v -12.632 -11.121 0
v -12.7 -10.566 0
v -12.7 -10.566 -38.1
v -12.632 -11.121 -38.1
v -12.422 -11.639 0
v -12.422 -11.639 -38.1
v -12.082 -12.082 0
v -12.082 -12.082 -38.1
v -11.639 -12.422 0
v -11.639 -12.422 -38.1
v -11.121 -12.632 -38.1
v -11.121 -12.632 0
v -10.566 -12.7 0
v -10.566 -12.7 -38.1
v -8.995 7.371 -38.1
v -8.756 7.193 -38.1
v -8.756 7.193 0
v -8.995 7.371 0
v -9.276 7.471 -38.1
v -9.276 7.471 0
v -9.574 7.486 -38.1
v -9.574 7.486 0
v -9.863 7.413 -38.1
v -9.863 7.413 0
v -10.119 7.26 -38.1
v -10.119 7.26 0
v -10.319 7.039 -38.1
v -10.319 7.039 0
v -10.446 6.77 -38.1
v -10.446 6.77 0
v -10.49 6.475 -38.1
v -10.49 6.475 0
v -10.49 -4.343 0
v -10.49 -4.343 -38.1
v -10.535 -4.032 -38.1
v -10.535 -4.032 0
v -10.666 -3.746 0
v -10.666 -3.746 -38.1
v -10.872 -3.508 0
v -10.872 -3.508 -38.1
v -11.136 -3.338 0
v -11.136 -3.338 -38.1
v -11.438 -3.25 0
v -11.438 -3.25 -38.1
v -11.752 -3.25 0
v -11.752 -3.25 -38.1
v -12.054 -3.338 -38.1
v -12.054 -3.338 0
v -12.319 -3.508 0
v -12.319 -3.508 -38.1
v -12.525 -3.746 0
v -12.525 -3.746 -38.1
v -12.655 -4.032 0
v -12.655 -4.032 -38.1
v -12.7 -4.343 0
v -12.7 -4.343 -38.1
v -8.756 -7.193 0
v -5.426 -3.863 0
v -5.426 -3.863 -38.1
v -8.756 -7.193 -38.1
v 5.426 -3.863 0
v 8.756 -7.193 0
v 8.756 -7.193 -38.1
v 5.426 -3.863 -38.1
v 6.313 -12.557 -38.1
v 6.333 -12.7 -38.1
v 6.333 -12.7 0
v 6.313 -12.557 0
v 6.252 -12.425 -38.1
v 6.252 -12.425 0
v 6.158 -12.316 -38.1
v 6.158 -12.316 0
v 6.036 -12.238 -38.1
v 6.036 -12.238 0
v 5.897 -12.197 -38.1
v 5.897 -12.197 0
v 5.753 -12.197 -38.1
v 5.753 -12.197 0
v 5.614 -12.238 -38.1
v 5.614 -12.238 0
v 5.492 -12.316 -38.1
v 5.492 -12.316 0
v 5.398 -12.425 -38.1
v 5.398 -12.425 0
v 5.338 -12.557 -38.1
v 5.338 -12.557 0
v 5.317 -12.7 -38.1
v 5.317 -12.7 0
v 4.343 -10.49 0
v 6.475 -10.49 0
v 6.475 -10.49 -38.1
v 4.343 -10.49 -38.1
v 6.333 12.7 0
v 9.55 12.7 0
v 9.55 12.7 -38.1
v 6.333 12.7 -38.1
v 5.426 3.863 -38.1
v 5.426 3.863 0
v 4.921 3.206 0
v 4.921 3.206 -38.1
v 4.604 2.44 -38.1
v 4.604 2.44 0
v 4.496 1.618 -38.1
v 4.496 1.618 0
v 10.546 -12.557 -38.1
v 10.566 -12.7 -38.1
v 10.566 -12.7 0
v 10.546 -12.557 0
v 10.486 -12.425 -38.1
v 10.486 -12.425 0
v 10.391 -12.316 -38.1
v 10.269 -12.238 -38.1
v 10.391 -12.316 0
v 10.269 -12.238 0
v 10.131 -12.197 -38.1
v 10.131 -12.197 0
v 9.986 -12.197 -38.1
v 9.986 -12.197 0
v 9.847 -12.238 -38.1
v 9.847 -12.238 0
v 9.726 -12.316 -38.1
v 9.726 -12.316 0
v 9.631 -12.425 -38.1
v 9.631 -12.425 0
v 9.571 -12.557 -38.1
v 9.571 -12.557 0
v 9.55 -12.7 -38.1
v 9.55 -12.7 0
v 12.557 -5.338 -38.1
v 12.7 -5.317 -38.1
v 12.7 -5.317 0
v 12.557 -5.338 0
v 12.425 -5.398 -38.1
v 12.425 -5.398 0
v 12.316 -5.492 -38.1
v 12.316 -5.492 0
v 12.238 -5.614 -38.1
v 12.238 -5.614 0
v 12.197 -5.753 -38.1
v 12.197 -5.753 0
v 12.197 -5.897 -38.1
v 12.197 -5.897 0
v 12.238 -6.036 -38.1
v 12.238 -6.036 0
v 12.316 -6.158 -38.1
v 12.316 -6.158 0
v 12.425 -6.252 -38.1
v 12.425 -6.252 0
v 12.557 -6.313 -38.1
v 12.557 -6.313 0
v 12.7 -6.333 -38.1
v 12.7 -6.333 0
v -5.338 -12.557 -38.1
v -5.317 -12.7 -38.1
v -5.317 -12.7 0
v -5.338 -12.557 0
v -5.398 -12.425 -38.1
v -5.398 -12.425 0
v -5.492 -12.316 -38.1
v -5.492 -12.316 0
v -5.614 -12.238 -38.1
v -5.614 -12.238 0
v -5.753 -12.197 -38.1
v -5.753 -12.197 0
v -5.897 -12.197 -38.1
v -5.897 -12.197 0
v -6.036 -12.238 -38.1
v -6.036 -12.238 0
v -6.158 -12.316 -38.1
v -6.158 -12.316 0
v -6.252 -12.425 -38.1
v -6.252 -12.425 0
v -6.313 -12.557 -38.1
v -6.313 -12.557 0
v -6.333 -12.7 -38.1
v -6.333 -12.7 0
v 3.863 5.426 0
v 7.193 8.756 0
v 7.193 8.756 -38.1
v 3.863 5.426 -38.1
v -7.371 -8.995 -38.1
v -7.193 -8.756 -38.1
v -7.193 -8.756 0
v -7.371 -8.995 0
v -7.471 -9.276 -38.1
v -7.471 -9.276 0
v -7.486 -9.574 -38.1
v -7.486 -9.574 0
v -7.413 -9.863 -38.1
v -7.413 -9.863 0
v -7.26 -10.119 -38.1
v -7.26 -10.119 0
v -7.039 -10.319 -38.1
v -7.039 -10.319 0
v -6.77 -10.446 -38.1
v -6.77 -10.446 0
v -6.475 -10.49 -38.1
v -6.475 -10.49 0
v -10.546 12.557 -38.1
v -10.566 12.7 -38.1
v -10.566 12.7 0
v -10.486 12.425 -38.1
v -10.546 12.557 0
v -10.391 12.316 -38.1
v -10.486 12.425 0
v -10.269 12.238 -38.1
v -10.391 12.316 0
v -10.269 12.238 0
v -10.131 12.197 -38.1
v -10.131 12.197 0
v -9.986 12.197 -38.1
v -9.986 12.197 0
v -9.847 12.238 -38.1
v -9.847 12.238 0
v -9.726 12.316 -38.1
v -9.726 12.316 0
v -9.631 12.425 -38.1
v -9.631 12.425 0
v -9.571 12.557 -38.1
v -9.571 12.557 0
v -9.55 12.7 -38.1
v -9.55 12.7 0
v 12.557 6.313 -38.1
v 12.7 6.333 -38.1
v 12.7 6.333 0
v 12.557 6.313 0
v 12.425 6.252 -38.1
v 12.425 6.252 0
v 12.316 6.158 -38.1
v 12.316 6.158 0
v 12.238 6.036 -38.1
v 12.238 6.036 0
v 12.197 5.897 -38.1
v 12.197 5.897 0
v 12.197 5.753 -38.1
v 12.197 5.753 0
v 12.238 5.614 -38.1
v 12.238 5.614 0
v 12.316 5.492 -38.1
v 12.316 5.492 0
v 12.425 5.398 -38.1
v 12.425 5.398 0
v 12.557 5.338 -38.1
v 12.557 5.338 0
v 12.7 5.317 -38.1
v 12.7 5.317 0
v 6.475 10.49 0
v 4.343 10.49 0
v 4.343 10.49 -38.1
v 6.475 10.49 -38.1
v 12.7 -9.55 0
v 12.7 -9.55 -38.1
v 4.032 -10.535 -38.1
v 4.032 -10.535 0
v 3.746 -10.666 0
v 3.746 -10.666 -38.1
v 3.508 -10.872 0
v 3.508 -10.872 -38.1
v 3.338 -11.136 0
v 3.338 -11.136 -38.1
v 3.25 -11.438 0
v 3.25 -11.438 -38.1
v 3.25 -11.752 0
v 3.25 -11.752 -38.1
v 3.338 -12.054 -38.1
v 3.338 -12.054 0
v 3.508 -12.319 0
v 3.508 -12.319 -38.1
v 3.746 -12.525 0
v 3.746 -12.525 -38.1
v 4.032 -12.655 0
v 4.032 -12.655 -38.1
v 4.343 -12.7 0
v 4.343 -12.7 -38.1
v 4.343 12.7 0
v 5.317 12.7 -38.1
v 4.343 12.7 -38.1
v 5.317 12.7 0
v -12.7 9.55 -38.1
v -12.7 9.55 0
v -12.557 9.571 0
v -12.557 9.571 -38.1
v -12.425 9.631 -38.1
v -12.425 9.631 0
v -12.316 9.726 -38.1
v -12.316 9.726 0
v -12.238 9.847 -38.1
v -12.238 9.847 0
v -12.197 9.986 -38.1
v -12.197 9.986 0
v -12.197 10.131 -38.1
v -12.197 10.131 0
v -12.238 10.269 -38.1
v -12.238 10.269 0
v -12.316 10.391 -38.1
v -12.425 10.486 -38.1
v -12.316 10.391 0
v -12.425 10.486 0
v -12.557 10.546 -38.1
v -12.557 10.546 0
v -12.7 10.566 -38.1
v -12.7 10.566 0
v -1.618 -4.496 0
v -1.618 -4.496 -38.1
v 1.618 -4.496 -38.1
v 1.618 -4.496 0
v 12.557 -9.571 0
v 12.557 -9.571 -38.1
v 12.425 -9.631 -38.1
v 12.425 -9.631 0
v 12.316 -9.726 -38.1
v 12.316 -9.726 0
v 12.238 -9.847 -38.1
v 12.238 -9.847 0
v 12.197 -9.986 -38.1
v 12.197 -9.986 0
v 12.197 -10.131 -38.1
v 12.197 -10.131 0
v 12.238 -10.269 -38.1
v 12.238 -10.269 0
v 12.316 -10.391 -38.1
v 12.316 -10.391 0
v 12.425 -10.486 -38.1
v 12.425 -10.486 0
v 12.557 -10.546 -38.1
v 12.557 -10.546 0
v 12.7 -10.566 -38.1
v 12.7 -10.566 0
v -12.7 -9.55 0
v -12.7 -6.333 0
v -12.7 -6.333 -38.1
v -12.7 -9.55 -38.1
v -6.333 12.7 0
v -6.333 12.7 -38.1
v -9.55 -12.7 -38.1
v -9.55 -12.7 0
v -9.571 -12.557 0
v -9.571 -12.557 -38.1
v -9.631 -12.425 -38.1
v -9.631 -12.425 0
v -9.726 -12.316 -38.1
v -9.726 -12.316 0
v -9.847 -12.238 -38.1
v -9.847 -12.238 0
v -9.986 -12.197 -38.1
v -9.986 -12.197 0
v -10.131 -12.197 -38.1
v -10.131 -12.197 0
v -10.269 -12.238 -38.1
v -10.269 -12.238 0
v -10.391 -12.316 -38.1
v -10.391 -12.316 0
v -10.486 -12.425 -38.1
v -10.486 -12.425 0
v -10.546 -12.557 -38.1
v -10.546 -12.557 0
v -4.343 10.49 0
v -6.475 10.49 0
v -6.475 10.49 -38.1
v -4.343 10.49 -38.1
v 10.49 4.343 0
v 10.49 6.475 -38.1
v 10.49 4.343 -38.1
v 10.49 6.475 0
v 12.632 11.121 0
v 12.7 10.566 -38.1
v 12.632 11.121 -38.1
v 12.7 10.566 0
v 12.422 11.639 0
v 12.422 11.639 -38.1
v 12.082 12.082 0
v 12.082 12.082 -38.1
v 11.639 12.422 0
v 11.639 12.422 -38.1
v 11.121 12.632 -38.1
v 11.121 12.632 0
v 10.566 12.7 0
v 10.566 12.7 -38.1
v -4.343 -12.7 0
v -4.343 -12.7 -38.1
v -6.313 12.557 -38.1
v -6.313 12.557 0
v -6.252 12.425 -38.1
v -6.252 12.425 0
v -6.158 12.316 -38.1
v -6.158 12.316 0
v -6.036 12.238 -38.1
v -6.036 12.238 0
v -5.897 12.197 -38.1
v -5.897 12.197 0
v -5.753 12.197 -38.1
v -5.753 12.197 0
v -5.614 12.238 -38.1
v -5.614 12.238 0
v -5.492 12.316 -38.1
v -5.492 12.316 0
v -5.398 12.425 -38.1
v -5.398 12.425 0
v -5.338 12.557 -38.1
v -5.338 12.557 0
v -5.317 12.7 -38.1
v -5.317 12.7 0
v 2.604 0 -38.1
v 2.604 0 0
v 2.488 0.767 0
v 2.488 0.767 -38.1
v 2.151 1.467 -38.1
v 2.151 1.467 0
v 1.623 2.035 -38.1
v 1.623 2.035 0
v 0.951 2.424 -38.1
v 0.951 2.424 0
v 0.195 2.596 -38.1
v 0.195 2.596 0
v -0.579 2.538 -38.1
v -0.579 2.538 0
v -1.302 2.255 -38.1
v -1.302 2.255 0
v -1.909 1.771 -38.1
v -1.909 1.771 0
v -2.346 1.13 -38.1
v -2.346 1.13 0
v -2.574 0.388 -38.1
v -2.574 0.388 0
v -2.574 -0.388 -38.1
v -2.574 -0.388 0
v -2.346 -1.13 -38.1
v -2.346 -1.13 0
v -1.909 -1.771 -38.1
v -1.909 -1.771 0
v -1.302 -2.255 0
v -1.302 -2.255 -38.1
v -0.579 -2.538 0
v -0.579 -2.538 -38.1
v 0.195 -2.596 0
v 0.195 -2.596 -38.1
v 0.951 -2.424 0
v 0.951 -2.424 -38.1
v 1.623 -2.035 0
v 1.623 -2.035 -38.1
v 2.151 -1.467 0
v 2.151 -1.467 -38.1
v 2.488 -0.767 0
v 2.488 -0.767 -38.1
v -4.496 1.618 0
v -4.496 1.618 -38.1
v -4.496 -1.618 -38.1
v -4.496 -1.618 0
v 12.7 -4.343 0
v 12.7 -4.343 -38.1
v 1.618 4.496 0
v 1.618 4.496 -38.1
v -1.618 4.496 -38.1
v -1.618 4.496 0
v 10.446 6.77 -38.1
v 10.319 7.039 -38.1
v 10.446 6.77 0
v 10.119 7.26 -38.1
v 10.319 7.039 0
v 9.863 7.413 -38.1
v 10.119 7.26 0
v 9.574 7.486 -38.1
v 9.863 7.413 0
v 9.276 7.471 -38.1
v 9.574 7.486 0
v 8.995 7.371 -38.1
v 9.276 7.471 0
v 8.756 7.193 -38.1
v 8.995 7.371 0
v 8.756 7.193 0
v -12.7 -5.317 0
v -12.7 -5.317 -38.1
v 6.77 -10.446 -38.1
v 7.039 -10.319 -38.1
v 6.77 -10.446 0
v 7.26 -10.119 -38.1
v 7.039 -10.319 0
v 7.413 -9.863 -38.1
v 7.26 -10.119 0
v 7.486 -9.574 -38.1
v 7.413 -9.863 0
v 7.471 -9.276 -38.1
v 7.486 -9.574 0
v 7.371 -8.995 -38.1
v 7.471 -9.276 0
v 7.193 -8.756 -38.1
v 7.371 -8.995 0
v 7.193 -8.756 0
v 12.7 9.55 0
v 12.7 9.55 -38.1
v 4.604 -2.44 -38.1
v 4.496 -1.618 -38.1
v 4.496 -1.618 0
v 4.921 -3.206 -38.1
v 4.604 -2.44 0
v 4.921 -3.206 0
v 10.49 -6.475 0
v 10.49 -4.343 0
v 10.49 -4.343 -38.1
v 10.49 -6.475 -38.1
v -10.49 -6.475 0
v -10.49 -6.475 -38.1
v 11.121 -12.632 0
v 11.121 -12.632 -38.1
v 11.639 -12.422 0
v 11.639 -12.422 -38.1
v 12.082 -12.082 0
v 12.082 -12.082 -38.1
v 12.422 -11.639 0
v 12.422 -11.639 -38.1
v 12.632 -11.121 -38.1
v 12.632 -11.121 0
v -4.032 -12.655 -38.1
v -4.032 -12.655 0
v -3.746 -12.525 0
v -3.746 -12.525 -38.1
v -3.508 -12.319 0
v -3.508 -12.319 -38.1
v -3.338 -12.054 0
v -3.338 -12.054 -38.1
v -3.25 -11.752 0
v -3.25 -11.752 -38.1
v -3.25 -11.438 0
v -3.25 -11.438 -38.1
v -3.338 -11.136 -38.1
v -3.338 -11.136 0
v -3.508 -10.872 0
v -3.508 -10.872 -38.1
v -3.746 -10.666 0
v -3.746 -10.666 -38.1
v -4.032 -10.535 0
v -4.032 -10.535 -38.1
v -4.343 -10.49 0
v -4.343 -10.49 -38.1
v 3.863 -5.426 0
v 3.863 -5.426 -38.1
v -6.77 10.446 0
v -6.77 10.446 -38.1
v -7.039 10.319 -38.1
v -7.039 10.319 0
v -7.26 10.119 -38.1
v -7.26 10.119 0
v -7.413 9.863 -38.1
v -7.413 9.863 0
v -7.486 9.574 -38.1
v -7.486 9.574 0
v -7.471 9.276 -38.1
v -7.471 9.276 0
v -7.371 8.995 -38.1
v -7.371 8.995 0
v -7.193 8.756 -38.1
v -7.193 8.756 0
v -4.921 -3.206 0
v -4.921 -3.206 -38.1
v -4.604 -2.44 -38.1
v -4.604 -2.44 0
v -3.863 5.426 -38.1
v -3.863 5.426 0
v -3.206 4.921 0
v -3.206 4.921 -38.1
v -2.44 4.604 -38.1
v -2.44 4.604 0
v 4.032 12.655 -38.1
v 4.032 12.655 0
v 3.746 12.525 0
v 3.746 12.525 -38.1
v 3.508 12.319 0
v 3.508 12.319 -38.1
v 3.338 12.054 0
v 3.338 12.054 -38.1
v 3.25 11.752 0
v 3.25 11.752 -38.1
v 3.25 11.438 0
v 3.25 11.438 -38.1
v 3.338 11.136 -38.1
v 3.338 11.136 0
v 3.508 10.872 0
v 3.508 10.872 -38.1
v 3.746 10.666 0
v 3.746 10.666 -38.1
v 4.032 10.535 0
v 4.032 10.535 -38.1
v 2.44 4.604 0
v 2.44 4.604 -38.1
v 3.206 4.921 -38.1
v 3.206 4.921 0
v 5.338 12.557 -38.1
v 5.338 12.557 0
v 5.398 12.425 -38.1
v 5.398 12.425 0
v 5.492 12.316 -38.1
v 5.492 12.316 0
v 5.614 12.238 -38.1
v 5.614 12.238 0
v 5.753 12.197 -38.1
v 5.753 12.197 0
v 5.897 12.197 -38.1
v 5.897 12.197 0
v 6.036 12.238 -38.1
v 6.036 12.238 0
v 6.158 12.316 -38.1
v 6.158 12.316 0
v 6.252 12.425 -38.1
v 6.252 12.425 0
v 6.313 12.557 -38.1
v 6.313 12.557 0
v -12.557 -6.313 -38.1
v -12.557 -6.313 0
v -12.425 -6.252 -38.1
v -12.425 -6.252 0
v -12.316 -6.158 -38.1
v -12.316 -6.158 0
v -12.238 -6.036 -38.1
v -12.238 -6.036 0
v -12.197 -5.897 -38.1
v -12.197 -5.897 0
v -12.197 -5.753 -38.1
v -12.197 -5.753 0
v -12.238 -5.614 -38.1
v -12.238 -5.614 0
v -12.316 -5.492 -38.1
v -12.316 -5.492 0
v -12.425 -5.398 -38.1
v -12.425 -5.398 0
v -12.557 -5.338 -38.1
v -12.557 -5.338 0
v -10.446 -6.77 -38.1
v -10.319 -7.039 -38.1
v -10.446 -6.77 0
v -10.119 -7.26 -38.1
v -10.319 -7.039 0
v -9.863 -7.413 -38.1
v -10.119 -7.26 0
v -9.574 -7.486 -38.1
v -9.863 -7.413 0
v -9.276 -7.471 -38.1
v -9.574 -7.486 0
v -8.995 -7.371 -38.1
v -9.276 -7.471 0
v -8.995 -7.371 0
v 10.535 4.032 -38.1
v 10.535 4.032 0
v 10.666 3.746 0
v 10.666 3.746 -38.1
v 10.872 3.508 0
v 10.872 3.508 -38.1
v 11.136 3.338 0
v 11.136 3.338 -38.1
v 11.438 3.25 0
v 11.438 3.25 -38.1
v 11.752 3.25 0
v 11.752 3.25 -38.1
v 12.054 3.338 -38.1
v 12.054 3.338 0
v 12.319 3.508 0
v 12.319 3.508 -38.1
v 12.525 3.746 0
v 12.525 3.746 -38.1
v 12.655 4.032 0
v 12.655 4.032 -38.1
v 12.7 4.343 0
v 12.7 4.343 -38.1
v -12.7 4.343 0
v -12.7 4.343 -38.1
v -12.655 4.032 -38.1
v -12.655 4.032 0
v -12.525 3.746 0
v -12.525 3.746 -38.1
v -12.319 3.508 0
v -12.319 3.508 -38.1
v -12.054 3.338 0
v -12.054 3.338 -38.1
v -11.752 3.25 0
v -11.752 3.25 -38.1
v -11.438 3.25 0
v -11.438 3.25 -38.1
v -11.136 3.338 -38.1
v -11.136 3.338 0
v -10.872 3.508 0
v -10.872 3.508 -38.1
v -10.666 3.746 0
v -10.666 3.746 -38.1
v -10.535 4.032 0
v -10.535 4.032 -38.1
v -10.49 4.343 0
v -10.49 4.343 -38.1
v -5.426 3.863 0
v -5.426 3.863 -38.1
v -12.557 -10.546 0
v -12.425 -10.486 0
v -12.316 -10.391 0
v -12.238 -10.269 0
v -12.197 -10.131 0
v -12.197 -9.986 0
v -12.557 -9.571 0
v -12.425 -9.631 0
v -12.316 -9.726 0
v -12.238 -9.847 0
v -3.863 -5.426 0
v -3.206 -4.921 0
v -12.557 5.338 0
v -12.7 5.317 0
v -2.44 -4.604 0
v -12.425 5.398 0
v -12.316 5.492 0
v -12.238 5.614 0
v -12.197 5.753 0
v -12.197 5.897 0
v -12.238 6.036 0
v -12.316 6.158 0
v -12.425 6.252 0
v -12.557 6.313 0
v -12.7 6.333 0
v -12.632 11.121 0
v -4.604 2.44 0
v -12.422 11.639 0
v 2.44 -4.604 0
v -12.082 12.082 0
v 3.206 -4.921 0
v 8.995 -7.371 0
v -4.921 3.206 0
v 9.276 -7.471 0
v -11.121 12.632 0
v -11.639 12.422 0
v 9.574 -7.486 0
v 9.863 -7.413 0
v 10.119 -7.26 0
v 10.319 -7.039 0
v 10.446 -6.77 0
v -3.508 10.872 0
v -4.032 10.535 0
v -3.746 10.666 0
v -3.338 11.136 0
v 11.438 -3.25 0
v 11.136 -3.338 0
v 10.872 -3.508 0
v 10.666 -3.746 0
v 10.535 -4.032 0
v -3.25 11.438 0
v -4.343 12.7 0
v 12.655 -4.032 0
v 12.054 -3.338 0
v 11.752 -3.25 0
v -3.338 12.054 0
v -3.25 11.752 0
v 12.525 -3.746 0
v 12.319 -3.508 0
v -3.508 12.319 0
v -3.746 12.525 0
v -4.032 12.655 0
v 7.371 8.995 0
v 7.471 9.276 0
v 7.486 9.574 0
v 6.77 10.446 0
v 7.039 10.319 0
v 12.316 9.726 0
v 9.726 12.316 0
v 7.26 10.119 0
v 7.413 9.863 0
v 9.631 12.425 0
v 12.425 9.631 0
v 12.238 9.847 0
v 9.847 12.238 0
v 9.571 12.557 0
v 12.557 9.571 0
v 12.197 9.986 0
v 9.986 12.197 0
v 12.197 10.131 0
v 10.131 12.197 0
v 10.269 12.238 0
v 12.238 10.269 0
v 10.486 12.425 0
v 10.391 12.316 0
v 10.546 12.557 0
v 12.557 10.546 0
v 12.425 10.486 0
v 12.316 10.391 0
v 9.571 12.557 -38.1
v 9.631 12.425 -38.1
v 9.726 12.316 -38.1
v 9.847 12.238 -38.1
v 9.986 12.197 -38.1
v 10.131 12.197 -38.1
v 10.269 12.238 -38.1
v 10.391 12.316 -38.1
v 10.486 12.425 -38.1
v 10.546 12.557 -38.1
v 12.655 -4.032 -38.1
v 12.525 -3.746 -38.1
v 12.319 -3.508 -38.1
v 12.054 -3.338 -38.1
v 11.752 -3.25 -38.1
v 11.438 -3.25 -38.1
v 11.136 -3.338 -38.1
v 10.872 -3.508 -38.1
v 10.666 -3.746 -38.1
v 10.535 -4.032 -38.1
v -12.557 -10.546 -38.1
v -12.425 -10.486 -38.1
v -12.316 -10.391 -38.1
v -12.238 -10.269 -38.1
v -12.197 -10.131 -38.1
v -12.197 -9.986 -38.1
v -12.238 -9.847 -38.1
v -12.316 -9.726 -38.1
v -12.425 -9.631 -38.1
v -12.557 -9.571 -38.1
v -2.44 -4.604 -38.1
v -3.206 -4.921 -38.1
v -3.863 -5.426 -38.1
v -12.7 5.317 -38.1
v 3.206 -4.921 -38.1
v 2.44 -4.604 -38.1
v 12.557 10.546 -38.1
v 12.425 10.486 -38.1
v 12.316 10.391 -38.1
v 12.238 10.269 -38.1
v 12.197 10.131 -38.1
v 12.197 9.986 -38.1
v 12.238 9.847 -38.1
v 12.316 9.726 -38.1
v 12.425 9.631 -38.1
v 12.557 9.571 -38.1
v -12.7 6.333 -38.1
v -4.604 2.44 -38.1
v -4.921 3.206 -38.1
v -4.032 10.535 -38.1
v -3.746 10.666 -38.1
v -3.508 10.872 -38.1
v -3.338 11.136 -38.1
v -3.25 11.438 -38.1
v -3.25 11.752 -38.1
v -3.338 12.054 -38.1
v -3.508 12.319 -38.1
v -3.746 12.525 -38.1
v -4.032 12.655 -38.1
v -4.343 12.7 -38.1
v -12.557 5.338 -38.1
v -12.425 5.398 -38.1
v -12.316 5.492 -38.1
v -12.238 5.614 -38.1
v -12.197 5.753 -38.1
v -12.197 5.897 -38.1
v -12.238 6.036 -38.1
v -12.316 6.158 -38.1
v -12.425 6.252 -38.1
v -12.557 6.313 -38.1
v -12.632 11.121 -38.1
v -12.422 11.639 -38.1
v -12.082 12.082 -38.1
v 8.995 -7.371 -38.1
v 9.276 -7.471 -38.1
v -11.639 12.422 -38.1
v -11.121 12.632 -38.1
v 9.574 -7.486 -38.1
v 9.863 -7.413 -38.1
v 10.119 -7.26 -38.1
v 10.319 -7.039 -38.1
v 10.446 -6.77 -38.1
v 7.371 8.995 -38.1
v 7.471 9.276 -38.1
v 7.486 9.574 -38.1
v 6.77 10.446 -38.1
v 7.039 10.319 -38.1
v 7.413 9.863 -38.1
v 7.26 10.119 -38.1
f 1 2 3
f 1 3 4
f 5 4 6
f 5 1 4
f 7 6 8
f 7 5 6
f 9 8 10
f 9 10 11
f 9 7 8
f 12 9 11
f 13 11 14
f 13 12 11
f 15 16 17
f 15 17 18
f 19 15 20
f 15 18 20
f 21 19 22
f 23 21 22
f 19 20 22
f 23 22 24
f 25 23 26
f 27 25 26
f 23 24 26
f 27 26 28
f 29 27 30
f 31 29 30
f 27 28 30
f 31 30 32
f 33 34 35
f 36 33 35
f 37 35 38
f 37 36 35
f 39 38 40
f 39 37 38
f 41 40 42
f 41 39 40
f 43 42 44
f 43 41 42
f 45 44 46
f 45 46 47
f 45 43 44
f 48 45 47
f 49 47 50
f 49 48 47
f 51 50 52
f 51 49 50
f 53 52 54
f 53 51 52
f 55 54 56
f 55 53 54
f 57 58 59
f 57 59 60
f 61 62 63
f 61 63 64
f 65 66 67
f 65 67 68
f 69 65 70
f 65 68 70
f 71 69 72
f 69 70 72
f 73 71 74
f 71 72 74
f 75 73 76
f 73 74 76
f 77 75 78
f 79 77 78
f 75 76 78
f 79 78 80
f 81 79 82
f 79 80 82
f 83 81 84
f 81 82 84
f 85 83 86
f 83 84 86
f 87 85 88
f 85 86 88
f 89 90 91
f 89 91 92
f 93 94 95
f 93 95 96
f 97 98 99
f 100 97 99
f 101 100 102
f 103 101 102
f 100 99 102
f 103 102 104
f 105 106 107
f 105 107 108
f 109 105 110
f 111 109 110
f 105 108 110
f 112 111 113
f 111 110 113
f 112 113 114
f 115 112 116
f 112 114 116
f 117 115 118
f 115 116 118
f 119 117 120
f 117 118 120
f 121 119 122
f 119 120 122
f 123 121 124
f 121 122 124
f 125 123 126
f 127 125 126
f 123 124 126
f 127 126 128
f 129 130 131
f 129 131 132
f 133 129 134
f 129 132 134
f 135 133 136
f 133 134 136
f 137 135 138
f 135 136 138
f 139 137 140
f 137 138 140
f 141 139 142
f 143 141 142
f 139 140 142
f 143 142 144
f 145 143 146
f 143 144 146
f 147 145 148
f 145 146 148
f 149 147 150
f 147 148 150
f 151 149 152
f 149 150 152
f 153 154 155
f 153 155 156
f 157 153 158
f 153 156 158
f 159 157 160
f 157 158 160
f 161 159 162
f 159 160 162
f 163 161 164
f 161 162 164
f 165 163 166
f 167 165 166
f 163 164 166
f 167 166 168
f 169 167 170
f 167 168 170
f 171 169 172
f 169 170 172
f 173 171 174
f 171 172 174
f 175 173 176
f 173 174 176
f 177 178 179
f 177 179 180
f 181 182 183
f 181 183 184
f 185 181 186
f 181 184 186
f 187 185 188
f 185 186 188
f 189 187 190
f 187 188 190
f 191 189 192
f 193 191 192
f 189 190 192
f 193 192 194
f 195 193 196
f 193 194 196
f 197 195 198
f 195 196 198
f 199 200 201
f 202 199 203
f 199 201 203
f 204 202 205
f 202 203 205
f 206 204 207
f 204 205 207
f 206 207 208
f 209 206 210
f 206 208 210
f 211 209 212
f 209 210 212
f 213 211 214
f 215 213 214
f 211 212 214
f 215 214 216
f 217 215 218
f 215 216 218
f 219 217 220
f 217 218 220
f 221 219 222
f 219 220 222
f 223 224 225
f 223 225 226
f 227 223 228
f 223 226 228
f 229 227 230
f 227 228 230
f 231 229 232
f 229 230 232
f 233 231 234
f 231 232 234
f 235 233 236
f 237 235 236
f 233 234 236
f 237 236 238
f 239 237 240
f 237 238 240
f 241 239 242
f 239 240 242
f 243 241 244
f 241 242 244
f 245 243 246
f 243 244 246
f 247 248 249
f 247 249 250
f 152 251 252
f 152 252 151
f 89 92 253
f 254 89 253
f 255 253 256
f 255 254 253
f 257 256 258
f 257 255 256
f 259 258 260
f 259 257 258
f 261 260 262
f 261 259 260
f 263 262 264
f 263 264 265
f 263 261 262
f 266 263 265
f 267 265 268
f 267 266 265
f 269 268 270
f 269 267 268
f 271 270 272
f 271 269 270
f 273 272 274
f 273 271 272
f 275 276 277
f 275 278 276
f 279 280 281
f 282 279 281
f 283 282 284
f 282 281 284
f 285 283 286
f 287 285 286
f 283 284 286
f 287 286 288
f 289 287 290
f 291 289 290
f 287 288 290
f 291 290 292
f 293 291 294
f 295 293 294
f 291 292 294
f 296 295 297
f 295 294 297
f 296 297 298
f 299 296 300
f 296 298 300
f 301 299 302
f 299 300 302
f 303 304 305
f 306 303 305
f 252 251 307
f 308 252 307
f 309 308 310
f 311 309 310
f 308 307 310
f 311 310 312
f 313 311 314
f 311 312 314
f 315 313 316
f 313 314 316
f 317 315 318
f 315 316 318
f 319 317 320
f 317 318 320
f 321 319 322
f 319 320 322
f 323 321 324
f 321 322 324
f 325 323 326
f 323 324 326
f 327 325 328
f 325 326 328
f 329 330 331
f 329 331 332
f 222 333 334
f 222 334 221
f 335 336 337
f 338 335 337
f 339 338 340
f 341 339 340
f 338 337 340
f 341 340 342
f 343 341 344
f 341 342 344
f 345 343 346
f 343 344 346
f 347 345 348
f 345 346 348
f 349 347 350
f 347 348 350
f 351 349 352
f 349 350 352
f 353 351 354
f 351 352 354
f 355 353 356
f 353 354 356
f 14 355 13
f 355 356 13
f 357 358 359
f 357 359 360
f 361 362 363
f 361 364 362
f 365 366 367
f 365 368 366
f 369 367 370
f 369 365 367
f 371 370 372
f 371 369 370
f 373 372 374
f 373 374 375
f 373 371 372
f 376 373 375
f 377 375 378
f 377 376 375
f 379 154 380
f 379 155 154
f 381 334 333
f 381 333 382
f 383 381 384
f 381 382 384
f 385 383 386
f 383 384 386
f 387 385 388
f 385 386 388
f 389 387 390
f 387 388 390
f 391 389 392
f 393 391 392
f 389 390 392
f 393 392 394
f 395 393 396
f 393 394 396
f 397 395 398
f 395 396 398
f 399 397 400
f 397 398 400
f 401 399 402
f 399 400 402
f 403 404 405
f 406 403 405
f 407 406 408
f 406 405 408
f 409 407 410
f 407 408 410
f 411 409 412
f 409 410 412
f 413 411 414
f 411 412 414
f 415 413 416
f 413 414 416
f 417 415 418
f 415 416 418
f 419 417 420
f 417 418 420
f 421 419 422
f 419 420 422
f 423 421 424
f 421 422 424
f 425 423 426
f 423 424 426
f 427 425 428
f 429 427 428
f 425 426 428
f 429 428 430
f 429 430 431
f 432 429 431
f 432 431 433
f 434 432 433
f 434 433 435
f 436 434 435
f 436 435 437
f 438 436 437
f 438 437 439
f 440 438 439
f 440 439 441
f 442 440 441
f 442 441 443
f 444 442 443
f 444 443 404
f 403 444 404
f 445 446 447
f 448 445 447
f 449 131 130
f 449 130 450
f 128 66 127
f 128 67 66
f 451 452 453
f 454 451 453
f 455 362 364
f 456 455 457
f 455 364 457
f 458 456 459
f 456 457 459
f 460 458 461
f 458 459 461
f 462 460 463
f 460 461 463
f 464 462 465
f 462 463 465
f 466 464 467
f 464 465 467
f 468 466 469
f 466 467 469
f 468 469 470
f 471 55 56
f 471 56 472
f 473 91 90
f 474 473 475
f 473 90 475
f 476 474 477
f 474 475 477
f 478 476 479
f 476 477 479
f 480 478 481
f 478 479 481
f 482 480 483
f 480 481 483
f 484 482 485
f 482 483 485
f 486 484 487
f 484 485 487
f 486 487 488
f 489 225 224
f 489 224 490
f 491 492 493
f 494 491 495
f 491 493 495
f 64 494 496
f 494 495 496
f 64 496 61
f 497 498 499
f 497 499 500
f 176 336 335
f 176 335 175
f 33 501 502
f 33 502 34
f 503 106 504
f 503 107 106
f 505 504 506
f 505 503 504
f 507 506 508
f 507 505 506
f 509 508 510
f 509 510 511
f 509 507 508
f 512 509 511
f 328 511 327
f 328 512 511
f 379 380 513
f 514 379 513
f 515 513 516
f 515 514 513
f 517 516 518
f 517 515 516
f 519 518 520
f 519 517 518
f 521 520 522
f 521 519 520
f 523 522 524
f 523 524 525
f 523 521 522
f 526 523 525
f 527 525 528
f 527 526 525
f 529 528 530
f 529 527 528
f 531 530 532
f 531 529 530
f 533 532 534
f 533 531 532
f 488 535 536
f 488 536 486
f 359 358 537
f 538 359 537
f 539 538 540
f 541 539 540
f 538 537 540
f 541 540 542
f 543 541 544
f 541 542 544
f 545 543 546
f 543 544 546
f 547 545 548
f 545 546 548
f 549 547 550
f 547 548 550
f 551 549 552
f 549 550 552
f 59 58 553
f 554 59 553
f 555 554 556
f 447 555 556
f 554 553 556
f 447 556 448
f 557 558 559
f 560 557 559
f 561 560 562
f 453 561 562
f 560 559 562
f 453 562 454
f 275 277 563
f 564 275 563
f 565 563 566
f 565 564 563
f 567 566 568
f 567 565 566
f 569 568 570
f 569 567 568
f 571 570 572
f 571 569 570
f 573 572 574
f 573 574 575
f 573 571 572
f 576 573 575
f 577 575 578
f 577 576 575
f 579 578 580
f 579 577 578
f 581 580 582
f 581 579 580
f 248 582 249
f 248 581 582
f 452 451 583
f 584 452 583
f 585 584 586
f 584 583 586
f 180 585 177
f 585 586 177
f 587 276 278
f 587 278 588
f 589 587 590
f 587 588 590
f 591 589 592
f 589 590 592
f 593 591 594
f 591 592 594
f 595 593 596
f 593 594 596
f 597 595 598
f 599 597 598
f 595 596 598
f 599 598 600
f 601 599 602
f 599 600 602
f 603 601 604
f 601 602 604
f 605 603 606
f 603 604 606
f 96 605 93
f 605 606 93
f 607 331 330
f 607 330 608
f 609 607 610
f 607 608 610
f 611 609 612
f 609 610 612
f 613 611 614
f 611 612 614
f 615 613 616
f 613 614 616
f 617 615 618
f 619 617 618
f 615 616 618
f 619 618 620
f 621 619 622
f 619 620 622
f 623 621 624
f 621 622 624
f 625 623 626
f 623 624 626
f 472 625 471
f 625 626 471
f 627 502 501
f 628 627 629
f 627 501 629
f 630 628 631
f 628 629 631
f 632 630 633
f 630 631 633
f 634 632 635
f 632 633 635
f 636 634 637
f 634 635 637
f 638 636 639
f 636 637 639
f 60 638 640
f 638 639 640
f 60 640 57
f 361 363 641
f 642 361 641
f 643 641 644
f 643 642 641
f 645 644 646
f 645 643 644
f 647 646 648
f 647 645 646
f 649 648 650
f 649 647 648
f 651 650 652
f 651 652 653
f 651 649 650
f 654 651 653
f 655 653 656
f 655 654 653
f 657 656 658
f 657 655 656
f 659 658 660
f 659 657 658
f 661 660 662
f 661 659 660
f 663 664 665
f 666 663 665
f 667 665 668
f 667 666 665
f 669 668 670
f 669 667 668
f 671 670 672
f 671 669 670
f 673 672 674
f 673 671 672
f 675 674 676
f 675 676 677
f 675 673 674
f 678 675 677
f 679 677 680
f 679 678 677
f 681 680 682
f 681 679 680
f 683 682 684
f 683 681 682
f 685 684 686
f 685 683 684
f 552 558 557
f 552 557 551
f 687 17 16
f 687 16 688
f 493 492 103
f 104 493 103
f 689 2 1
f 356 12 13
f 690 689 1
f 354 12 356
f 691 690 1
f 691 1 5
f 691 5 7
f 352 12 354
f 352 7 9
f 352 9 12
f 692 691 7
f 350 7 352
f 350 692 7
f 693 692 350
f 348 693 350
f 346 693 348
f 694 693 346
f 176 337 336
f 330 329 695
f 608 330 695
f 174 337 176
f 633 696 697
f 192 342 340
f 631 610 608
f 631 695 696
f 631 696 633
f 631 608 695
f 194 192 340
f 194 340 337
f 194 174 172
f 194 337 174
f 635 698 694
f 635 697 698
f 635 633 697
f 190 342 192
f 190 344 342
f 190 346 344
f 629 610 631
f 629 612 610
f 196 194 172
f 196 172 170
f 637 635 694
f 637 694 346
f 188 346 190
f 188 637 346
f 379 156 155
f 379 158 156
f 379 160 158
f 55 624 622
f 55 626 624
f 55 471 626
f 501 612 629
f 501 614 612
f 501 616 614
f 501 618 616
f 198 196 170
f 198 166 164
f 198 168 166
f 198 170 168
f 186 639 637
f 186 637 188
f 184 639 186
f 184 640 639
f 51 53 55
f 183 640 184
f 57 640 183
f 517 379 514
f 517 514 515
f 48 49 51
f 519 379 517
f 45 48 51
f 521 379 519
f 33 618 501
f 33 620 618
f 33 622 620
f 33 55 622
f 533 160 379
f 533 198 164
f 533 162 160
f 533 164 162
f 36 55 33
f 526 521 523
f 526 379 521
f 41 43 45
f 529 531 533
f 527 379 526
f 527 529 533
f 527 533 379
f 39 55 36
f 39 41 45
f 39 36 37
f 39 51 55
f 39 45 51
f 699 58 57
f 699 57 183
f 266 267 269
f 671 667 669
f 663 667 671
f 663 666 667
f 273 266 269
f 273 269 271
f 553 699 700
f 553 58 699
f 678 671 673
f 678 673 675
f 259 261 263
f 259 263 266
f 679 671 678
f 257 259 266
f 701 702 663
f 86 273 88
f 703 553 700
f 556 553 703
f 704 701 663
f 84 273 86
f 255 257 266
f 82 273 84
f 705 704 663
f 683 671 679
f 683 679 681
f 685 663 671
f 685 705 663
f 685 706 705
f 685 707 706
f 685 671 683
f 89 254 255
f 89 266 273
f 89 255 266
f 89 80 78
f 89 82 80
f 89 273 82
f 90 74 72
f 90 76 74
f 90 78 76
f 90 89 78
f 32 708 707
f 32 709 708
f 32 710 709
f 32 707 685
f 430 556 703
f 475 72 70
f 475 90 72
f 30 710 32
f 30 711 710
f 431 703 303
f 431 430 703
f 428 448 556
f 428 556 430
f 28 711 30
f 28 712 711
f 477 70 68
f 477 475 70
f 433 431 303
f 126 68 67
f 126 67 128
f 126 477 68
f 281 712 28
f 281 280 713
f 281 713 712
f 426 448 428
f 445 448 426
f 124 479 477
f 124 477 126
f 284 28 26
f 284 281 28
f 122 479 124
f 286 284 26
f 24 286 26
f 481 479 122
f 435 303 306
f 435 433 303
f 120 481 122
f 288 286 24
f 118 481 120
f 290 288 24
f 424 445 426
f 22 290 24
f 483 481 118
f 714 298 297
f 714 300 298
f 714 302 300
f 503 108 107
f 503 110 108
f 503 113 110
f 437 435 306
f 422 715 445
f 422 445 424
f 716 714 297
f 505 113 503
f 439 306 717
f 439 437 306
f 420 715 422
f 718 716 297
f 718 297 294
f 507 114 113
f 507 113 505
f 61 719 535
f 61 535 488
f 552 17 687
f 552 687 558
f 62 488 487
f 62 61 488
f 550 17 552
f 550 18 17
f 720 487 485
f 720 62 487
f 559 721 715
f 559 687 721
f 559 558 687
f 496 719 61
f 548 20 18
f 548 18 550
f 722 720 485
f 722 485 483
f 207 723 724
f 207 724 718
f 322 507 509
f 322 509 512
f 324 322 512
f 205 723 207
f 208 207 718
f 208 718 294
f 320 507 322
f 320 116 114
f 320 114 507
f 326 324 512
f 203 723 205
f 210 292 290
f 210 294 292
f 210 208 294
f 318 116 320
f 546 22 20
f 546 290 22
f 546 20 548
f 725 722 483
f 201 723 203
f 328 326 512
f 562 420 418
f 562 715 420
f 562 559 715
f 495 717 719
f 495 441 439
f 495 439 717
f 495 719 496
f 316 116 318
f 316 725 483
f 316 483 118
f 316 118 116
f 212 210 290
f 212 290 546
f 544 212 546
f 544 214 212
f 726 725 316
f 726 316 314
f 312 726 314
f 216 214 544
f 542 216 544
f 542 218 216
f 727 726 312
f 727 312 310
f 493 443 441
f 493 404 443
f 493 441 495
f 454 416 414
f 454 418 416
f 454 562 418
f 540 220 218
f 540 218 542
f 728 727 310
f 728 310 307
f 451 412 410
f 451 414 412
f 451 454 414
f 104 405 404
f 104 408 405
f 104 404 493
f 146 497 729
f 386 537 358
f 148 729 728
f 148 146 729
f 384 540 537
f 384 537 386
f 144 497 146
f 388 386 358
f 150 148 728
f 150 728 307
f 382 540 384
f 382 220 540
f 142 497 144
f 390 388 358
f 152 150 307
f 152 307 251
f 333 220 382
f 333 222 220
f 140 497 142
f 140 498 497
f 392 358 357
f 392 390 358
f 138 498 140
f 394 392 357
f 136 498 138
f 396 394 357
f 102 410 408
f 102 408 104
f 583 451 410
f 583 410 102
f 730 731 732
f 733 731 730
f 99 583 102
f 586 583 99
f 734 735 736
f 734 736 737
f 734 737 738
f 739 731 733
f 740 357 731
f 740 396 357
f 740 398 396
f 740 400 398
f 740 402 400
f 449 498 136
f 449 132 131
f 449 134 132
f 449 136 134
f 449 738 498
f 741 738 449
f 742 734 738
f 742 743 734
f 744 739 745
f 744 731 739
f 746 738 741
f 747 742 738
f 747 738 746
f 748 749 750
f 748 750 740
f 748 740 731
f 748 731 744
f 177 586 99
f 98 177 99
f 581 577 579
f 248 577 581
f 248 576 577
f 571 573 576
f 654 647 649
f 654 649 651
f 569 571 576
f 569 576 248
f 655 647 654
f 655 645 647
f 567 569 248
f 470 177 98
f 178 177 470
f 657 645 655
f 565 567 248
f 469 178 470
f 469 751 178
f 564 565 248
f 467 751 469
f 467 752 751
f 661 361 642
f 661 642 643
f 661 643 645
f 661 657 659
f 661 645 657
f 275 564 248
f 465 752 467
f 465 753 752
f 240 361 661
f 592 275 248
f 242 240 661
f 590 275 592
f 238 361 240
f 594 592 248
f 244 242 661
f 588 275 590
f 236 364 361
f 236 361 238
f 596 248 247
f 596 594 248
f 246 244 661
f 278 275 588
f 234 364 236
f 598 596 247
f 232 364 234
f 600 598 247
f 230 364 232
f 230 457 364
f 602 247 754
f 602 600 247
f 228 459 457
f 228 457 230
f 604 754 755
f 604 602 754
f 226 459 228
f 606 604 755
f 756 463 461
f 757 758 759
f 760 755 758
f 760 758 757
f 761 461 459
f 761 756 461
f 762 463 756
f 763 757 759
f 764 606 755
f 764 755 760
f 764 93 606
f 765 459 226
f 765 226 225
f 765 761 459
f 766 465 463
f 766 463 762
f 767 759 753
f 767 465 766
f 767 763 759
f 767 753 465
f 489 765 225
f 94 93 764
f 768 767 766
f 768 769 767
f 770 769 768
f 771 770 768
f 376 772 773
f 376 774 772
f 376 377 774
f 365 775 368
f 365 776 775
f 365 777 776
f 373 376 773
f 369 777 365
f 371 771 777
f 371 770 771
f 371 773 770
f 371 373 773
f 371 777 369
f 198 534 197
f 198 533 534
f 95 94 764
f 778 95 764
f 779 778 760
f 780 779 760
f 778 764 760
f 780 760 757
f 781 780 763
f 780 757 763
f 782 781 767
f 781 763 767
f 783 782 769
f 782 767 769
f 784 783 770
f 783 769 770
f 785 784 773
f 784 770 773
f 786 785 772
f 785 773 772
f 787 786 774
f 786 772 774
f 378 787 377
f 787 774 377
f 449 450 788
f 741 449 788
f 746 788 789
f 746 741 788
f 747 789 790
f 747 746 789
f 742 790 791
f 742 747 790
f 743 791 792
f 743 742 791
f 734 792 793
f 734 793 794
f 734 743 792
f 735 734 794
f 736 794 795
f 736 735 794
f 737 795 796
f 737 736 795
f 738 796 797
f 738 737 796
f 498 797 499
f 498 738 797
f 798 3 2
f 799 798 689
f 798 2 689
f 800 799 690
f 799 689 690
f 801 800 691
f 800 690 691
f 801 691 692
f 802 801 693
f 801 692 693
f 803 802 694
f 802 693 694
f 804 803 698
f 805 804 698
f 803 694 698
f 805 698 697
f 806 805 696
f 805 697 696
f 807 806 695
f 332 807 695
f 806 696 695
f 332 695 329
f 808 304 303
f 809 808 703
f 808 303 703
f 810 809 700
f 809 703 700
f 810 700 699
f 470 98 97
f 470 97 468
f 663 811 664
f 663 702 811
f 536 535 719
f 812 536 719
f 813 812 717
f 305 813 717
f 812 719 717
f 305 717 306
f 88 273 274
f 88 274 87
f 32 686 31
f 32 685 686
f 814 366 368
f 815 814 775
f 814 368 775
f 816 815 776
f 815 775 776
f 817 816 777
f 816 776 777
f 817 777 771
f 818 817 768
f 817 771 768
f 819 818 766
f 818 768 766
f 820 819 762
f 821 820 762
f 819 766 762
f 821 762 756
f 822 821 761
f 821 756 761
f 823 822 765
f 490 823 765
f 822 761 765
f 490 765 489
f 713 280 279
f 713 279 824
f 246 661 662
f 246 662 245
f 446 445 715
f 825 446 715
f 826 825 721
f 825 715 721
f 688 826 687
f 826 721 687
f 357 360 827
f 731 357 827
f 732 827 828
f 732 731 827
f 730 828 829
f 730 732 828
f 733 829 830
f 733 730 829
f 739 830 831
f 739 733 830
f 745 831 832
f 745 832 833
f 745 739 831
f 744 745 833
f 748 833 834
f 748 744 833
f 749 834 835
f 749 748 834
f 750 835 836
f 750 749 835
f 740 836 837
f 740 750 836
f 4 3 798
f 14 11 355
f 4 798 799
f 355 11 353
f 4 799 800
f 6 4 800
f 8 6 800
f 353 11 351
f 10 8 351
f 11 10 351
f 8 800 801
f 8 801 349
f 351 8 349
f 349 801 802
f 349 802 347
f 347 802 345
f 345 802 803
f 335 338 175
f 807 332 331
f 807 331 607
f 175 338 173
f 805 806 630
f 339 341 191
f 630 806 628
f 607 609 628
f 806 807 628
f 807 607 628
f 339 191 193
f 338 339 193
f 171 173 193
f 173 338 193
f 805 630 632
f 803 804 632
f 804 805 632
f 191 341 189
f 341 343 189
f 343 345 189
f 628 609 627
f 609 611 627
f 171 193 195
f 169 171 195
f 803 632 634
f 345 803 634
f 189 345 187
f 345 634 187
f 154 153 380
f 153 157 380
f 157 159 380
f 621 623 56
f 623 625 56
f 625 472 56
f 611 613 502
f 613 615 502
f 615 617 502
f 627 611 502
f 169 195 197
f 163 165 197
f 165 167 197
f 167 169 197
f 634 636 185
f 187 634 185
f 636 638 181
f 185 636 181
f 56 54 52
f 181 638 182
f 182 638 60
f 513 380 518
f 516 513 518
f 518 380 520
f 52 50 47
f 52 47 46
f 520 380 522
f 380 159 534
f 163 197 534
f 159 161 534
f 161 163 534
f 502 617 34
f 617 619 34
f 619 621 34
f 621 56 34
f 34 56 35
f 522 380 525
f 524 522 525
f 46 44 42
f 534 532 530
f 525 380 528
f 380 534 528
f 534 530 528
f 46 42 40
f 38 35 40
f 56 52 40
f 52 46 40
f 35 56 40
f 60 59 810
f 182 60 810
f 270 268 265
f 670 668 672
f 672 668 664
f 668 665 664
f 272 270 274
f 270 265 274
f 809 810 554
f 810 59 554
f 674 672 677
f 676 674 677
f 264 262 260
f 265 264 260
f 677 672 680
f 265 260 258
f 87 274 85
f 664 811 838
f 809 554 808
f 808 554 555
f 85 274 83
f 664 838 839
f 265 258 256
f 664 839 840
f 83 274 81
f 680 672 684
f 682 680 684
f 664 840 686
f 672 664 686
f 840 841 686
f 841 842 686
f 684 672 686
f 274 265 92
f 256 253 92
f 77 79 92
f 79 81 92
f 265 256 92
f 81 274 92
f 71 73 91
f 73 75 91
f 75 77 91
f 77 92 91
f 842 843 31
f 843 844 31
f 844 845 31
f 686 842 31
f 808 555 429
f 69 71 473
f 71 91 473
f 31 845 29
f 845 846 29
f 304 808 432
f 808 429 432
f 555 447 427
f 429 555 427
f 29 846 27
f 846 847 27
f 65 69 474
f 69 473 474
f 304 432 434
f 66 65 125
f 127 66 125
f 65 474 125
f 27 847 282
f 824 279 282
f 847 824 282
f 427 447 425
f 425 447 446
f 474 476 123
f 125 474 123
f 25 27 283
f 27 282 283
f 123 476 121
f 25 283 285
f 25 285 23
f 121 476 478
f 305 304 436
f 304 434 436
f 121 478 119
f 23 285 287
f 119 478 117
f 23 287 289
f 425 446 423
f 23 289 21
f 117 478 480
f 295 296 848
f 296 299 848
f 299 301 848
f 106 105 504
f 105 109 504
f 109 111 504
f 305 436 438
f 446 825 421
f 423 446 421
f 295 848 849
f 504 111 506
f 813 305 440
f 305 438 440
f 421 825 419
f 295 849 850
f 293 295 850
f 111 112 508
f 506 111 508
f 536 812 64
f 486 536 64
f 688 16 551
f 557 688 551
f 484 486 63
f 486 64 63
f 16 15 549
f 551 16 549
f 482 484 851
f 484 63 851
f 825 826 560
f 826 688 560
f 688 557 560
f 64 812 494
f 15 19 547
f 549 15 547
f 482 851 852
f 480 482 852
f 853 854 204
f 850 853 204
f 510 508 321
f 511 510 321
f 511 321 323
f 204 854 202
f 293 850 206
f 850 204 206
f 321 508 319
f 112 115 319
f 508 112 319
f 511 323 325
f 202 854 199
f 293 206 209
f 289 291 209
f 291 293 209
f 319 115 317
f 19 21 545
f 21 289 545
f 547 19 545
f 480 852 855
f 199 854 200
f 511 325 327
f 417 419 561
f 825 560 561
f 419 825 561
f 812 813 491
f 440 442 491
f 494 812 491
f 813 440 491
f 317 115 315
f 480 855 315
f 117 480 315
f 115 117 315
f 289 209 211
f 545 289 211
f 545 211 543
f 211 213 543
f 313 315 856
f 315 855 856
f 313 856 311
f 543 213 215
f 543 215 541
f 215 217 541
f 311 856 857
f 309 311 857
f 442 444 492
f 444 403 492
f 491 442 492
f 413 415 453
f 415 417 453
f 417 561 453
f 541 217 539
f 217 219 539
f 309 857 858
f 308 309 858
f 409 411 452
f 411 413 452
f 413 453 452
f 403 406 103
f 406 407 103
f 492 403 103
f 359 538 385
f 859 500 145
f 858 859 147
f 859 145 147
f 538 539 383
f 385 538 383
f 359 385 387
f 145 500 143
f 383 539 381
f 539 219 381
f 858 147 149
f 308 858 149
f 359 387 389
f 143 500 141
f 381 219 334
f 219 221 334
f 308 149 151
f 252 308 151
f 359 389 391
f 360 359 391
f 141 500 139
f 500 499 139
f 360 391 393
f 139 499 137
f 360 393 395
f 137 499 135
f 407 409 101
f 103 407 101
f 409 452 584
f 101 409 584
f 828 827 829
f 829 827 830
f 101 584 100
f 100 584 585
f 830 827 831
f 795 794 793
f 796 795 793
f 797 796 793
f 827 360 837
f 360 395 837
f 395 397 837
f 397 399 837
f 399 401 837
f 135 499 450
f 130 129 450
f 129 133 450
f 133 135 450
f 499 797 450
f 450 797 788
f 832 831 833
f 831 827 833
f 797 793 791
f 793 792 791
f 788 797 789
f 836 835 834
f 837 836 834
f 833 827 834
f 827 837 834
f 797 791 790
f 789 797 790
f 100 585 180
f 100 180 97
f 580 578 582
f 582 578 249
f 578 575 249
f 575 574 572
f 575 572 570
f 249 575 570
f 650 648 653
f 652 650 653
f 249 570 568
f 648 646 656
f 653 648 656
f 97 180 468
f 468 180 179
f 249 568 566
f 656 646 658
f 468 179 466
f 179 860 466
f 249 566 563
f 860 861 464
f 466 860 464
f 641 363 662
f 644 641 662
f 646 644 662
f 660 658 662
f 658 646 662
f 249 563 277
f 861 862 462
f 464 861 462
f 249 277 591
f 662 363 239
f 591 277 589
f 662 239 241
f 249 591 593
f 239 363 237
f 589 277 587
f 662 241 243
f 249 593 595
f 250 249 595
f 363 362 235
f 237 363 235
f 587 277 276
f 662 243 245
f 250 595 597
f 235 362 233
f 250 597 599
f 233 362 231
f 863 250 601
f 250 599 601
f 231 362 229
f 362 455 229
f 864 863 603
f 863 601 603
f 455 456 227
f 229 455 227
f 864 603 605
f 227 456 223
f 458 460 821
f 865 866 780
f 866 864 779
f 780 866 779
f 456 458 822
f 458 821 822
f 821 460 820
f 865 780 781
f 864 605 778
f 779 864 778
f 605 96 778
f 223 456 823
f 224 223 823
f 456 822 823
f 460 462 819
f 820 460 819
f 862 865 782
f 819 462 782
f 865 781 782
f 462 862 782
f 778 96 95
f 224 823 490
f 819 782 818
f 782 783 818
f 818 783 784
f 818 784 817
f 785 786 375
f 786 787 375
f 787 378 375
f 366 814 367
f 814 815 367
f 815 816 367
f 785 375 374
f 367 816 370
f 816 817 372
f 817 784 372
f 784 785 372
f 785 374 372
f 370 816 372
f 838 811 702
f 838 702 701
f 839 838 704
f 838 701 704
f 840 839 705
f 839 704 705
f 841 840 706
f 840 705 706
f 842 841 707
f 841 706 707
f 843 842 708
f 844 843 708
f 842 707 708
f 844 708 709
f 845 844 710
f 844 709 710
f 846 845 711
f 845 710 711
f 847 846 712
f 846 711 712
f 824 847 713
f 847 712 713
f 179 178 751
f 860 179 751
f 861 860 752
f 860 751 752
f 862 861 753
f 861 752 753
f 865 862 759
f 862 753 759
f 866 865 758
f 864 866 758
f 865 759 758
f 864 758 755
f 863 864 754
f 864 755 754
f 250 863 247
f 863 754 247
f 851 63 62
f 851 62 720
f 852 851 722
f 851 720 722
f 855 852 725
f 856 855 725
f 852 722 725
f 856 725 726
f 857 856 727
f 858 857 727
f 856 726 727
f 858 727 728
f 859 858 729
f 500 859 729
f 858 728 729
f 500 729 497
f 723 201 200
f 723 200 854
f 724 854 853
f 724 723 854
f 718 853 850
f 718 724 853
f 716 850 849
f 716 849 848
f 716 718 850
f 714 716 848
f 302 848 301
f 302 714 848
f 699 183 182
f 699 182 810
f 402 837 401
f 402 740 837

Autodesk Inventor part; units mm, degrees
ref_plane "YZ Plane" through (0, 0, 0) normal (1, 0, 0) x (0, 1, 0)
ref_plane "XZ Plane" through (0, 0, 0) normal (0, 1, 0) x (-1, 0, 0)
ref_plane "XY Plane" through (0, 0, 0) normal (0, 0, 1) x (1, 0, 0)
sketch "Sketch_1" plane through (0, 0, 0) normal (0, 0, 1) x (1, 0, 0)
  arc A0 (-12.6998, -10.5664) -> (-10.5664, -12.6998) centre (-10.5918, -10.5918) ccw
  arc A1 (-9.5504, -12.7) -> (-10.5664, -12.6998) centre (-10.0584, -12.7) ccw
  line L0 (-9.5504, -12.7) -> (-6.3331, -12.7)
  arc A2 (-5.3171, -12.7) -> (-6.3331, -12.7) centre (-5.8251, -12.7) ccw
  line L1 (-5.3171, -12.7) -> (-4.3434, -12.7)
  arc A3 (-4.3434, -12.7) -> (-4.3434, -10.4902) centre (-4.3434, -11.5951) ccw
  line L2 (-4.3434, -10.4902) -> (-6.4748, -10.4902)
  arc A4 (-7.1932, -8.7558) -> (-6.4748, -10.4902) centre (-6.4748, -9.4742) ccw
  line L3 (-7.1932, -8.7558) -> (-3.8632, -5.4257)
  arc A5 (-1.6181, -4.4958) -> (-3.8632, -5.4257) centre (-1.6181, -7.6708) ccw
  line L4 (-1.6181, -4.4958) -> (1.6181, -4.4958)
  arc A6 (3.8632, -5.4257) -> (1.6181, -4.4958) centre (1.6181, -7.6708) ccw
  line L5 (3.8632, -5.4257) -> (7.1932, -8.7558)
  arc A7 (6.4748, -10.4902) -> (7.1932, -8.7558) centre (6.4748, -9.4742) ccw
  line L6 (6.4748, -10.4902) -> (4.3434, -10.4902)
  arc A8 (4.3434, -10.4902) -> (4.3434, -12.7) centre (4.3434, -11.5951) ccw
  line L7 (4.3434, -12.7) -> (5.3171, -12.7)
  arc A9 (6.3331, -12.7) -> (5.3171, -12.7) centre (5.8251, -12.7) ccw
  line L8 (6.3331, -12.7) -> (9.5504, -12.7)
  arc A10 (10.5664, -12.6998) -> (9.5504, -12.7) centre (10.0584, -12.7) ccw
  arc A11 (10.5664, -12.6998) -> (12.6998, -10.5664) centre (10.5918, -10.5918) ccw
  arc A12 (12.7, -9.5504) -> (12.6998, -10.5664) centre (12.7, -10.0584) ccw
  line L9 (12.7, -9.5504) -> (12.7, -6.3331)
  arc A13 (12.7, -5.3171) -> (12.7, -6.3331) centre (12.7, -5.8251) ccw
  line L10 (12.7, -5.3171) -> (12.7, -4.3434)
  arc A14 (12.7, -4.3434) -> (10.4902, -4.3434) centre (11.5951, -4.3434) ccw
  line L11 (10.4902, -4.3434) -> (10.4902, -6.4748)
  arc A15 (8.7558, -7.1932) -> (10.4902, -6.4748) centre (9.4742, -6.4748) ccw
  line L12 (8.7558, -7.1932) -> (5.4257, -3.8632)
  arc A16 (4.4958, -1.6181) -> (5.4257, -3.8632) centre (7.6708, -1.6181) ccw
  line L13 (4.4958, -1.6181) -> (4.4958, 1.6181)
  arc A17 (5.4257, 3.8632) -> (4.4958, 1.6181) centre (7.6708, 1.6181) ccw
  line L14 (5.4257, 3.8632) -> (8.7558, 7.1932)
  arc A18 (10.4902, 6.4748) -> (8.7558, 7.1932) centre (9.4742, 6.4748) ccw
  line L15 (10.4902, 6.4748) -> (10.4902, 4.3434)
  arc A19 (10.4902, 4.3434) -> (12.7, 4.3434) centre (11.5951, 4.3434) ccw
  line L16 (12.7, 4.3434) -> (12.7, 5.3171)
  arc A20 (12.7, 6.3331) -> (12.7, 5.3171) centre (12.7, 5.8251) ccw
  line L17 (12.7, 6.3331) -> (12.7, 9.5504)
  arc A21 (12.6998, 10.5664) -> (12.7, 9.5504) centre (12.7, 10.0584) ccw
  arc A22 (12.6998, 10.5664) -> (10.5664, 12.6998) centre (10.5918, 10.5918) ccw
  arc A23 (9.5504, 12.7) -> (10.5664, 12.6998) centre (10.0584, 12.7) ccw
  line L18 (9.5504, 12.7) -> (6.3331, 12.7)
  arc A24 (5.3171, 12.7) -> (6.3331, 12.7) centre (5.8251, 12.7) ccw
  line L19 (5.3171, 12.7) -> (4.3434, 12.7)
  arc A25 (4.3434, 12.7) -> (4.3434, 10.4902) centre (4.3434, 11.5951) ccw
  line L20 (4.3434, 10.4902) -> (6.4748, 10.4902)
  arc A26 (7.1932, 8.7558) -> (6.4748, 10.4902) centre (6.4748, 9.4742) ccw
  line L21 (7.1932, 8.7558) -> (3.8632, 5.4257)
  arc A27 (1.6181, 4.4958) -> (3.8632, 5.4257) centre (1.6181, 7.6708) ccw
  line L22 (1.6181, 4.4958) -> (-1.6181, 4.4958)
  arc A28 (-3.8632, 5.4257) -> (-1.6181, 4.4958) centre (-1.6181, 7.6708) ccw
  line L23 (-3.8632, 5.4257) -> (-7.1932, 8.7558)
  arc A29 (-6.4748, 10.4902) -> (-7.1932, 8.7558) centre (-6.4748, 9.4742) ccw
  line L24 (-6.4748, 10.4902) -> (-4.3434, 10.4902)
  arc A30 (-4.3434, 10.4902) -> (-4.3434, 12.7) centre (-4.3434, 11.5951) ccw
  line L25 (-4.3434, 12.7) -> (-5.3171, 12.7)
  arc A31 (-6.3331, 12.7) -> (-5.3171, 12.7) centre (-5.8251, 12.7) ccw
  line L26 (-6.3331, 12.7) -> (-9.5504, 12.7)
  arc A32 (-10.5664, 12.6998) -> (-9.5504, 12.7) centre (-10.0584, 12.7) ccw
  arc A33 (-10.5664, 12.6998) -> (-12.6998, 10.5664) centre (-10.5918, 10.5918) ccw
  arc A34 (-12.7, 9.5504) -> (-12.6998, 10.5664) centre (-12.7, 10.0584) ccw
  line L27 (-12.7, 9.5504) -> (-12.7, 6.3331)
  arc A35 (-12.7, 5.3171) -> (-12.7, 6.3331) centre (-12.7, 5.8251) ccw
  line L28 (-12.7, 5.3171) -> (-12.7, 4.3434)
  arc A36 (-12.7, 4.3434) -> (-10.4902, 4.3434) centre (-11.5951, 4.3434) ccw
  line L29 (-10.4902, 4.3434) -> (-10.4902, 6.4748)
  arc A37 (-8.7558, 7.1932) -> (-10.4902, 6.4748) centre (-9.4742, 6.4748) ccw
  line L30 (-8.7558, 7.1932) -> (-5.4257, 3.8632)
  arc A38 (-4.4958, 1.6181) -> (-5.4257, 3.8632) centre (-7.6708, 1.6181) ccw
  line L31 (-4.4958, 1.6181) -> (-4.4958, -1.6181)
  arc A39 (-5.4257, -3.8632) -> (-4.4958, -1.6181) centre (-7.6708, -1.6181) ccw
  line L32 (-5.4257, -3.8632) -> (-8.7558, -7.1932)
  arc A40 (-10.4902, -6.4748) -> (-8.7558, -7.1932) centre (-9.4742, -6.4748) ccw
  line L33 (-10.4902, -6.4748) -> (-10.4902, -4.3434)
  arc A41 (-10.4902, -4.3434) -> (-12.7, -4.3434) centre (-11.5951, -4.3434) ccw
  line L34 (-12.7, -4.3434) -> (-12.7, -5.3171)
  arc A42 (-12.7, -6.3331) -> (-12.7, -5.3171) centre (-12.7, -5.8251) ccw
  line L35 (-12.7, -6.3331) -> (-12.7, -9.5504)
  arc A43 (-12.6998, -10.5664) -> (-12.7, -9.5504) centre (-12.7, -10.0584) ccw
  circle A44 centre (0, 0) radius 2.6035
extrude "Extrusion1" add sketch "Sketch_1" against normal blind 38.1
properties part number "1010-15-CL"
